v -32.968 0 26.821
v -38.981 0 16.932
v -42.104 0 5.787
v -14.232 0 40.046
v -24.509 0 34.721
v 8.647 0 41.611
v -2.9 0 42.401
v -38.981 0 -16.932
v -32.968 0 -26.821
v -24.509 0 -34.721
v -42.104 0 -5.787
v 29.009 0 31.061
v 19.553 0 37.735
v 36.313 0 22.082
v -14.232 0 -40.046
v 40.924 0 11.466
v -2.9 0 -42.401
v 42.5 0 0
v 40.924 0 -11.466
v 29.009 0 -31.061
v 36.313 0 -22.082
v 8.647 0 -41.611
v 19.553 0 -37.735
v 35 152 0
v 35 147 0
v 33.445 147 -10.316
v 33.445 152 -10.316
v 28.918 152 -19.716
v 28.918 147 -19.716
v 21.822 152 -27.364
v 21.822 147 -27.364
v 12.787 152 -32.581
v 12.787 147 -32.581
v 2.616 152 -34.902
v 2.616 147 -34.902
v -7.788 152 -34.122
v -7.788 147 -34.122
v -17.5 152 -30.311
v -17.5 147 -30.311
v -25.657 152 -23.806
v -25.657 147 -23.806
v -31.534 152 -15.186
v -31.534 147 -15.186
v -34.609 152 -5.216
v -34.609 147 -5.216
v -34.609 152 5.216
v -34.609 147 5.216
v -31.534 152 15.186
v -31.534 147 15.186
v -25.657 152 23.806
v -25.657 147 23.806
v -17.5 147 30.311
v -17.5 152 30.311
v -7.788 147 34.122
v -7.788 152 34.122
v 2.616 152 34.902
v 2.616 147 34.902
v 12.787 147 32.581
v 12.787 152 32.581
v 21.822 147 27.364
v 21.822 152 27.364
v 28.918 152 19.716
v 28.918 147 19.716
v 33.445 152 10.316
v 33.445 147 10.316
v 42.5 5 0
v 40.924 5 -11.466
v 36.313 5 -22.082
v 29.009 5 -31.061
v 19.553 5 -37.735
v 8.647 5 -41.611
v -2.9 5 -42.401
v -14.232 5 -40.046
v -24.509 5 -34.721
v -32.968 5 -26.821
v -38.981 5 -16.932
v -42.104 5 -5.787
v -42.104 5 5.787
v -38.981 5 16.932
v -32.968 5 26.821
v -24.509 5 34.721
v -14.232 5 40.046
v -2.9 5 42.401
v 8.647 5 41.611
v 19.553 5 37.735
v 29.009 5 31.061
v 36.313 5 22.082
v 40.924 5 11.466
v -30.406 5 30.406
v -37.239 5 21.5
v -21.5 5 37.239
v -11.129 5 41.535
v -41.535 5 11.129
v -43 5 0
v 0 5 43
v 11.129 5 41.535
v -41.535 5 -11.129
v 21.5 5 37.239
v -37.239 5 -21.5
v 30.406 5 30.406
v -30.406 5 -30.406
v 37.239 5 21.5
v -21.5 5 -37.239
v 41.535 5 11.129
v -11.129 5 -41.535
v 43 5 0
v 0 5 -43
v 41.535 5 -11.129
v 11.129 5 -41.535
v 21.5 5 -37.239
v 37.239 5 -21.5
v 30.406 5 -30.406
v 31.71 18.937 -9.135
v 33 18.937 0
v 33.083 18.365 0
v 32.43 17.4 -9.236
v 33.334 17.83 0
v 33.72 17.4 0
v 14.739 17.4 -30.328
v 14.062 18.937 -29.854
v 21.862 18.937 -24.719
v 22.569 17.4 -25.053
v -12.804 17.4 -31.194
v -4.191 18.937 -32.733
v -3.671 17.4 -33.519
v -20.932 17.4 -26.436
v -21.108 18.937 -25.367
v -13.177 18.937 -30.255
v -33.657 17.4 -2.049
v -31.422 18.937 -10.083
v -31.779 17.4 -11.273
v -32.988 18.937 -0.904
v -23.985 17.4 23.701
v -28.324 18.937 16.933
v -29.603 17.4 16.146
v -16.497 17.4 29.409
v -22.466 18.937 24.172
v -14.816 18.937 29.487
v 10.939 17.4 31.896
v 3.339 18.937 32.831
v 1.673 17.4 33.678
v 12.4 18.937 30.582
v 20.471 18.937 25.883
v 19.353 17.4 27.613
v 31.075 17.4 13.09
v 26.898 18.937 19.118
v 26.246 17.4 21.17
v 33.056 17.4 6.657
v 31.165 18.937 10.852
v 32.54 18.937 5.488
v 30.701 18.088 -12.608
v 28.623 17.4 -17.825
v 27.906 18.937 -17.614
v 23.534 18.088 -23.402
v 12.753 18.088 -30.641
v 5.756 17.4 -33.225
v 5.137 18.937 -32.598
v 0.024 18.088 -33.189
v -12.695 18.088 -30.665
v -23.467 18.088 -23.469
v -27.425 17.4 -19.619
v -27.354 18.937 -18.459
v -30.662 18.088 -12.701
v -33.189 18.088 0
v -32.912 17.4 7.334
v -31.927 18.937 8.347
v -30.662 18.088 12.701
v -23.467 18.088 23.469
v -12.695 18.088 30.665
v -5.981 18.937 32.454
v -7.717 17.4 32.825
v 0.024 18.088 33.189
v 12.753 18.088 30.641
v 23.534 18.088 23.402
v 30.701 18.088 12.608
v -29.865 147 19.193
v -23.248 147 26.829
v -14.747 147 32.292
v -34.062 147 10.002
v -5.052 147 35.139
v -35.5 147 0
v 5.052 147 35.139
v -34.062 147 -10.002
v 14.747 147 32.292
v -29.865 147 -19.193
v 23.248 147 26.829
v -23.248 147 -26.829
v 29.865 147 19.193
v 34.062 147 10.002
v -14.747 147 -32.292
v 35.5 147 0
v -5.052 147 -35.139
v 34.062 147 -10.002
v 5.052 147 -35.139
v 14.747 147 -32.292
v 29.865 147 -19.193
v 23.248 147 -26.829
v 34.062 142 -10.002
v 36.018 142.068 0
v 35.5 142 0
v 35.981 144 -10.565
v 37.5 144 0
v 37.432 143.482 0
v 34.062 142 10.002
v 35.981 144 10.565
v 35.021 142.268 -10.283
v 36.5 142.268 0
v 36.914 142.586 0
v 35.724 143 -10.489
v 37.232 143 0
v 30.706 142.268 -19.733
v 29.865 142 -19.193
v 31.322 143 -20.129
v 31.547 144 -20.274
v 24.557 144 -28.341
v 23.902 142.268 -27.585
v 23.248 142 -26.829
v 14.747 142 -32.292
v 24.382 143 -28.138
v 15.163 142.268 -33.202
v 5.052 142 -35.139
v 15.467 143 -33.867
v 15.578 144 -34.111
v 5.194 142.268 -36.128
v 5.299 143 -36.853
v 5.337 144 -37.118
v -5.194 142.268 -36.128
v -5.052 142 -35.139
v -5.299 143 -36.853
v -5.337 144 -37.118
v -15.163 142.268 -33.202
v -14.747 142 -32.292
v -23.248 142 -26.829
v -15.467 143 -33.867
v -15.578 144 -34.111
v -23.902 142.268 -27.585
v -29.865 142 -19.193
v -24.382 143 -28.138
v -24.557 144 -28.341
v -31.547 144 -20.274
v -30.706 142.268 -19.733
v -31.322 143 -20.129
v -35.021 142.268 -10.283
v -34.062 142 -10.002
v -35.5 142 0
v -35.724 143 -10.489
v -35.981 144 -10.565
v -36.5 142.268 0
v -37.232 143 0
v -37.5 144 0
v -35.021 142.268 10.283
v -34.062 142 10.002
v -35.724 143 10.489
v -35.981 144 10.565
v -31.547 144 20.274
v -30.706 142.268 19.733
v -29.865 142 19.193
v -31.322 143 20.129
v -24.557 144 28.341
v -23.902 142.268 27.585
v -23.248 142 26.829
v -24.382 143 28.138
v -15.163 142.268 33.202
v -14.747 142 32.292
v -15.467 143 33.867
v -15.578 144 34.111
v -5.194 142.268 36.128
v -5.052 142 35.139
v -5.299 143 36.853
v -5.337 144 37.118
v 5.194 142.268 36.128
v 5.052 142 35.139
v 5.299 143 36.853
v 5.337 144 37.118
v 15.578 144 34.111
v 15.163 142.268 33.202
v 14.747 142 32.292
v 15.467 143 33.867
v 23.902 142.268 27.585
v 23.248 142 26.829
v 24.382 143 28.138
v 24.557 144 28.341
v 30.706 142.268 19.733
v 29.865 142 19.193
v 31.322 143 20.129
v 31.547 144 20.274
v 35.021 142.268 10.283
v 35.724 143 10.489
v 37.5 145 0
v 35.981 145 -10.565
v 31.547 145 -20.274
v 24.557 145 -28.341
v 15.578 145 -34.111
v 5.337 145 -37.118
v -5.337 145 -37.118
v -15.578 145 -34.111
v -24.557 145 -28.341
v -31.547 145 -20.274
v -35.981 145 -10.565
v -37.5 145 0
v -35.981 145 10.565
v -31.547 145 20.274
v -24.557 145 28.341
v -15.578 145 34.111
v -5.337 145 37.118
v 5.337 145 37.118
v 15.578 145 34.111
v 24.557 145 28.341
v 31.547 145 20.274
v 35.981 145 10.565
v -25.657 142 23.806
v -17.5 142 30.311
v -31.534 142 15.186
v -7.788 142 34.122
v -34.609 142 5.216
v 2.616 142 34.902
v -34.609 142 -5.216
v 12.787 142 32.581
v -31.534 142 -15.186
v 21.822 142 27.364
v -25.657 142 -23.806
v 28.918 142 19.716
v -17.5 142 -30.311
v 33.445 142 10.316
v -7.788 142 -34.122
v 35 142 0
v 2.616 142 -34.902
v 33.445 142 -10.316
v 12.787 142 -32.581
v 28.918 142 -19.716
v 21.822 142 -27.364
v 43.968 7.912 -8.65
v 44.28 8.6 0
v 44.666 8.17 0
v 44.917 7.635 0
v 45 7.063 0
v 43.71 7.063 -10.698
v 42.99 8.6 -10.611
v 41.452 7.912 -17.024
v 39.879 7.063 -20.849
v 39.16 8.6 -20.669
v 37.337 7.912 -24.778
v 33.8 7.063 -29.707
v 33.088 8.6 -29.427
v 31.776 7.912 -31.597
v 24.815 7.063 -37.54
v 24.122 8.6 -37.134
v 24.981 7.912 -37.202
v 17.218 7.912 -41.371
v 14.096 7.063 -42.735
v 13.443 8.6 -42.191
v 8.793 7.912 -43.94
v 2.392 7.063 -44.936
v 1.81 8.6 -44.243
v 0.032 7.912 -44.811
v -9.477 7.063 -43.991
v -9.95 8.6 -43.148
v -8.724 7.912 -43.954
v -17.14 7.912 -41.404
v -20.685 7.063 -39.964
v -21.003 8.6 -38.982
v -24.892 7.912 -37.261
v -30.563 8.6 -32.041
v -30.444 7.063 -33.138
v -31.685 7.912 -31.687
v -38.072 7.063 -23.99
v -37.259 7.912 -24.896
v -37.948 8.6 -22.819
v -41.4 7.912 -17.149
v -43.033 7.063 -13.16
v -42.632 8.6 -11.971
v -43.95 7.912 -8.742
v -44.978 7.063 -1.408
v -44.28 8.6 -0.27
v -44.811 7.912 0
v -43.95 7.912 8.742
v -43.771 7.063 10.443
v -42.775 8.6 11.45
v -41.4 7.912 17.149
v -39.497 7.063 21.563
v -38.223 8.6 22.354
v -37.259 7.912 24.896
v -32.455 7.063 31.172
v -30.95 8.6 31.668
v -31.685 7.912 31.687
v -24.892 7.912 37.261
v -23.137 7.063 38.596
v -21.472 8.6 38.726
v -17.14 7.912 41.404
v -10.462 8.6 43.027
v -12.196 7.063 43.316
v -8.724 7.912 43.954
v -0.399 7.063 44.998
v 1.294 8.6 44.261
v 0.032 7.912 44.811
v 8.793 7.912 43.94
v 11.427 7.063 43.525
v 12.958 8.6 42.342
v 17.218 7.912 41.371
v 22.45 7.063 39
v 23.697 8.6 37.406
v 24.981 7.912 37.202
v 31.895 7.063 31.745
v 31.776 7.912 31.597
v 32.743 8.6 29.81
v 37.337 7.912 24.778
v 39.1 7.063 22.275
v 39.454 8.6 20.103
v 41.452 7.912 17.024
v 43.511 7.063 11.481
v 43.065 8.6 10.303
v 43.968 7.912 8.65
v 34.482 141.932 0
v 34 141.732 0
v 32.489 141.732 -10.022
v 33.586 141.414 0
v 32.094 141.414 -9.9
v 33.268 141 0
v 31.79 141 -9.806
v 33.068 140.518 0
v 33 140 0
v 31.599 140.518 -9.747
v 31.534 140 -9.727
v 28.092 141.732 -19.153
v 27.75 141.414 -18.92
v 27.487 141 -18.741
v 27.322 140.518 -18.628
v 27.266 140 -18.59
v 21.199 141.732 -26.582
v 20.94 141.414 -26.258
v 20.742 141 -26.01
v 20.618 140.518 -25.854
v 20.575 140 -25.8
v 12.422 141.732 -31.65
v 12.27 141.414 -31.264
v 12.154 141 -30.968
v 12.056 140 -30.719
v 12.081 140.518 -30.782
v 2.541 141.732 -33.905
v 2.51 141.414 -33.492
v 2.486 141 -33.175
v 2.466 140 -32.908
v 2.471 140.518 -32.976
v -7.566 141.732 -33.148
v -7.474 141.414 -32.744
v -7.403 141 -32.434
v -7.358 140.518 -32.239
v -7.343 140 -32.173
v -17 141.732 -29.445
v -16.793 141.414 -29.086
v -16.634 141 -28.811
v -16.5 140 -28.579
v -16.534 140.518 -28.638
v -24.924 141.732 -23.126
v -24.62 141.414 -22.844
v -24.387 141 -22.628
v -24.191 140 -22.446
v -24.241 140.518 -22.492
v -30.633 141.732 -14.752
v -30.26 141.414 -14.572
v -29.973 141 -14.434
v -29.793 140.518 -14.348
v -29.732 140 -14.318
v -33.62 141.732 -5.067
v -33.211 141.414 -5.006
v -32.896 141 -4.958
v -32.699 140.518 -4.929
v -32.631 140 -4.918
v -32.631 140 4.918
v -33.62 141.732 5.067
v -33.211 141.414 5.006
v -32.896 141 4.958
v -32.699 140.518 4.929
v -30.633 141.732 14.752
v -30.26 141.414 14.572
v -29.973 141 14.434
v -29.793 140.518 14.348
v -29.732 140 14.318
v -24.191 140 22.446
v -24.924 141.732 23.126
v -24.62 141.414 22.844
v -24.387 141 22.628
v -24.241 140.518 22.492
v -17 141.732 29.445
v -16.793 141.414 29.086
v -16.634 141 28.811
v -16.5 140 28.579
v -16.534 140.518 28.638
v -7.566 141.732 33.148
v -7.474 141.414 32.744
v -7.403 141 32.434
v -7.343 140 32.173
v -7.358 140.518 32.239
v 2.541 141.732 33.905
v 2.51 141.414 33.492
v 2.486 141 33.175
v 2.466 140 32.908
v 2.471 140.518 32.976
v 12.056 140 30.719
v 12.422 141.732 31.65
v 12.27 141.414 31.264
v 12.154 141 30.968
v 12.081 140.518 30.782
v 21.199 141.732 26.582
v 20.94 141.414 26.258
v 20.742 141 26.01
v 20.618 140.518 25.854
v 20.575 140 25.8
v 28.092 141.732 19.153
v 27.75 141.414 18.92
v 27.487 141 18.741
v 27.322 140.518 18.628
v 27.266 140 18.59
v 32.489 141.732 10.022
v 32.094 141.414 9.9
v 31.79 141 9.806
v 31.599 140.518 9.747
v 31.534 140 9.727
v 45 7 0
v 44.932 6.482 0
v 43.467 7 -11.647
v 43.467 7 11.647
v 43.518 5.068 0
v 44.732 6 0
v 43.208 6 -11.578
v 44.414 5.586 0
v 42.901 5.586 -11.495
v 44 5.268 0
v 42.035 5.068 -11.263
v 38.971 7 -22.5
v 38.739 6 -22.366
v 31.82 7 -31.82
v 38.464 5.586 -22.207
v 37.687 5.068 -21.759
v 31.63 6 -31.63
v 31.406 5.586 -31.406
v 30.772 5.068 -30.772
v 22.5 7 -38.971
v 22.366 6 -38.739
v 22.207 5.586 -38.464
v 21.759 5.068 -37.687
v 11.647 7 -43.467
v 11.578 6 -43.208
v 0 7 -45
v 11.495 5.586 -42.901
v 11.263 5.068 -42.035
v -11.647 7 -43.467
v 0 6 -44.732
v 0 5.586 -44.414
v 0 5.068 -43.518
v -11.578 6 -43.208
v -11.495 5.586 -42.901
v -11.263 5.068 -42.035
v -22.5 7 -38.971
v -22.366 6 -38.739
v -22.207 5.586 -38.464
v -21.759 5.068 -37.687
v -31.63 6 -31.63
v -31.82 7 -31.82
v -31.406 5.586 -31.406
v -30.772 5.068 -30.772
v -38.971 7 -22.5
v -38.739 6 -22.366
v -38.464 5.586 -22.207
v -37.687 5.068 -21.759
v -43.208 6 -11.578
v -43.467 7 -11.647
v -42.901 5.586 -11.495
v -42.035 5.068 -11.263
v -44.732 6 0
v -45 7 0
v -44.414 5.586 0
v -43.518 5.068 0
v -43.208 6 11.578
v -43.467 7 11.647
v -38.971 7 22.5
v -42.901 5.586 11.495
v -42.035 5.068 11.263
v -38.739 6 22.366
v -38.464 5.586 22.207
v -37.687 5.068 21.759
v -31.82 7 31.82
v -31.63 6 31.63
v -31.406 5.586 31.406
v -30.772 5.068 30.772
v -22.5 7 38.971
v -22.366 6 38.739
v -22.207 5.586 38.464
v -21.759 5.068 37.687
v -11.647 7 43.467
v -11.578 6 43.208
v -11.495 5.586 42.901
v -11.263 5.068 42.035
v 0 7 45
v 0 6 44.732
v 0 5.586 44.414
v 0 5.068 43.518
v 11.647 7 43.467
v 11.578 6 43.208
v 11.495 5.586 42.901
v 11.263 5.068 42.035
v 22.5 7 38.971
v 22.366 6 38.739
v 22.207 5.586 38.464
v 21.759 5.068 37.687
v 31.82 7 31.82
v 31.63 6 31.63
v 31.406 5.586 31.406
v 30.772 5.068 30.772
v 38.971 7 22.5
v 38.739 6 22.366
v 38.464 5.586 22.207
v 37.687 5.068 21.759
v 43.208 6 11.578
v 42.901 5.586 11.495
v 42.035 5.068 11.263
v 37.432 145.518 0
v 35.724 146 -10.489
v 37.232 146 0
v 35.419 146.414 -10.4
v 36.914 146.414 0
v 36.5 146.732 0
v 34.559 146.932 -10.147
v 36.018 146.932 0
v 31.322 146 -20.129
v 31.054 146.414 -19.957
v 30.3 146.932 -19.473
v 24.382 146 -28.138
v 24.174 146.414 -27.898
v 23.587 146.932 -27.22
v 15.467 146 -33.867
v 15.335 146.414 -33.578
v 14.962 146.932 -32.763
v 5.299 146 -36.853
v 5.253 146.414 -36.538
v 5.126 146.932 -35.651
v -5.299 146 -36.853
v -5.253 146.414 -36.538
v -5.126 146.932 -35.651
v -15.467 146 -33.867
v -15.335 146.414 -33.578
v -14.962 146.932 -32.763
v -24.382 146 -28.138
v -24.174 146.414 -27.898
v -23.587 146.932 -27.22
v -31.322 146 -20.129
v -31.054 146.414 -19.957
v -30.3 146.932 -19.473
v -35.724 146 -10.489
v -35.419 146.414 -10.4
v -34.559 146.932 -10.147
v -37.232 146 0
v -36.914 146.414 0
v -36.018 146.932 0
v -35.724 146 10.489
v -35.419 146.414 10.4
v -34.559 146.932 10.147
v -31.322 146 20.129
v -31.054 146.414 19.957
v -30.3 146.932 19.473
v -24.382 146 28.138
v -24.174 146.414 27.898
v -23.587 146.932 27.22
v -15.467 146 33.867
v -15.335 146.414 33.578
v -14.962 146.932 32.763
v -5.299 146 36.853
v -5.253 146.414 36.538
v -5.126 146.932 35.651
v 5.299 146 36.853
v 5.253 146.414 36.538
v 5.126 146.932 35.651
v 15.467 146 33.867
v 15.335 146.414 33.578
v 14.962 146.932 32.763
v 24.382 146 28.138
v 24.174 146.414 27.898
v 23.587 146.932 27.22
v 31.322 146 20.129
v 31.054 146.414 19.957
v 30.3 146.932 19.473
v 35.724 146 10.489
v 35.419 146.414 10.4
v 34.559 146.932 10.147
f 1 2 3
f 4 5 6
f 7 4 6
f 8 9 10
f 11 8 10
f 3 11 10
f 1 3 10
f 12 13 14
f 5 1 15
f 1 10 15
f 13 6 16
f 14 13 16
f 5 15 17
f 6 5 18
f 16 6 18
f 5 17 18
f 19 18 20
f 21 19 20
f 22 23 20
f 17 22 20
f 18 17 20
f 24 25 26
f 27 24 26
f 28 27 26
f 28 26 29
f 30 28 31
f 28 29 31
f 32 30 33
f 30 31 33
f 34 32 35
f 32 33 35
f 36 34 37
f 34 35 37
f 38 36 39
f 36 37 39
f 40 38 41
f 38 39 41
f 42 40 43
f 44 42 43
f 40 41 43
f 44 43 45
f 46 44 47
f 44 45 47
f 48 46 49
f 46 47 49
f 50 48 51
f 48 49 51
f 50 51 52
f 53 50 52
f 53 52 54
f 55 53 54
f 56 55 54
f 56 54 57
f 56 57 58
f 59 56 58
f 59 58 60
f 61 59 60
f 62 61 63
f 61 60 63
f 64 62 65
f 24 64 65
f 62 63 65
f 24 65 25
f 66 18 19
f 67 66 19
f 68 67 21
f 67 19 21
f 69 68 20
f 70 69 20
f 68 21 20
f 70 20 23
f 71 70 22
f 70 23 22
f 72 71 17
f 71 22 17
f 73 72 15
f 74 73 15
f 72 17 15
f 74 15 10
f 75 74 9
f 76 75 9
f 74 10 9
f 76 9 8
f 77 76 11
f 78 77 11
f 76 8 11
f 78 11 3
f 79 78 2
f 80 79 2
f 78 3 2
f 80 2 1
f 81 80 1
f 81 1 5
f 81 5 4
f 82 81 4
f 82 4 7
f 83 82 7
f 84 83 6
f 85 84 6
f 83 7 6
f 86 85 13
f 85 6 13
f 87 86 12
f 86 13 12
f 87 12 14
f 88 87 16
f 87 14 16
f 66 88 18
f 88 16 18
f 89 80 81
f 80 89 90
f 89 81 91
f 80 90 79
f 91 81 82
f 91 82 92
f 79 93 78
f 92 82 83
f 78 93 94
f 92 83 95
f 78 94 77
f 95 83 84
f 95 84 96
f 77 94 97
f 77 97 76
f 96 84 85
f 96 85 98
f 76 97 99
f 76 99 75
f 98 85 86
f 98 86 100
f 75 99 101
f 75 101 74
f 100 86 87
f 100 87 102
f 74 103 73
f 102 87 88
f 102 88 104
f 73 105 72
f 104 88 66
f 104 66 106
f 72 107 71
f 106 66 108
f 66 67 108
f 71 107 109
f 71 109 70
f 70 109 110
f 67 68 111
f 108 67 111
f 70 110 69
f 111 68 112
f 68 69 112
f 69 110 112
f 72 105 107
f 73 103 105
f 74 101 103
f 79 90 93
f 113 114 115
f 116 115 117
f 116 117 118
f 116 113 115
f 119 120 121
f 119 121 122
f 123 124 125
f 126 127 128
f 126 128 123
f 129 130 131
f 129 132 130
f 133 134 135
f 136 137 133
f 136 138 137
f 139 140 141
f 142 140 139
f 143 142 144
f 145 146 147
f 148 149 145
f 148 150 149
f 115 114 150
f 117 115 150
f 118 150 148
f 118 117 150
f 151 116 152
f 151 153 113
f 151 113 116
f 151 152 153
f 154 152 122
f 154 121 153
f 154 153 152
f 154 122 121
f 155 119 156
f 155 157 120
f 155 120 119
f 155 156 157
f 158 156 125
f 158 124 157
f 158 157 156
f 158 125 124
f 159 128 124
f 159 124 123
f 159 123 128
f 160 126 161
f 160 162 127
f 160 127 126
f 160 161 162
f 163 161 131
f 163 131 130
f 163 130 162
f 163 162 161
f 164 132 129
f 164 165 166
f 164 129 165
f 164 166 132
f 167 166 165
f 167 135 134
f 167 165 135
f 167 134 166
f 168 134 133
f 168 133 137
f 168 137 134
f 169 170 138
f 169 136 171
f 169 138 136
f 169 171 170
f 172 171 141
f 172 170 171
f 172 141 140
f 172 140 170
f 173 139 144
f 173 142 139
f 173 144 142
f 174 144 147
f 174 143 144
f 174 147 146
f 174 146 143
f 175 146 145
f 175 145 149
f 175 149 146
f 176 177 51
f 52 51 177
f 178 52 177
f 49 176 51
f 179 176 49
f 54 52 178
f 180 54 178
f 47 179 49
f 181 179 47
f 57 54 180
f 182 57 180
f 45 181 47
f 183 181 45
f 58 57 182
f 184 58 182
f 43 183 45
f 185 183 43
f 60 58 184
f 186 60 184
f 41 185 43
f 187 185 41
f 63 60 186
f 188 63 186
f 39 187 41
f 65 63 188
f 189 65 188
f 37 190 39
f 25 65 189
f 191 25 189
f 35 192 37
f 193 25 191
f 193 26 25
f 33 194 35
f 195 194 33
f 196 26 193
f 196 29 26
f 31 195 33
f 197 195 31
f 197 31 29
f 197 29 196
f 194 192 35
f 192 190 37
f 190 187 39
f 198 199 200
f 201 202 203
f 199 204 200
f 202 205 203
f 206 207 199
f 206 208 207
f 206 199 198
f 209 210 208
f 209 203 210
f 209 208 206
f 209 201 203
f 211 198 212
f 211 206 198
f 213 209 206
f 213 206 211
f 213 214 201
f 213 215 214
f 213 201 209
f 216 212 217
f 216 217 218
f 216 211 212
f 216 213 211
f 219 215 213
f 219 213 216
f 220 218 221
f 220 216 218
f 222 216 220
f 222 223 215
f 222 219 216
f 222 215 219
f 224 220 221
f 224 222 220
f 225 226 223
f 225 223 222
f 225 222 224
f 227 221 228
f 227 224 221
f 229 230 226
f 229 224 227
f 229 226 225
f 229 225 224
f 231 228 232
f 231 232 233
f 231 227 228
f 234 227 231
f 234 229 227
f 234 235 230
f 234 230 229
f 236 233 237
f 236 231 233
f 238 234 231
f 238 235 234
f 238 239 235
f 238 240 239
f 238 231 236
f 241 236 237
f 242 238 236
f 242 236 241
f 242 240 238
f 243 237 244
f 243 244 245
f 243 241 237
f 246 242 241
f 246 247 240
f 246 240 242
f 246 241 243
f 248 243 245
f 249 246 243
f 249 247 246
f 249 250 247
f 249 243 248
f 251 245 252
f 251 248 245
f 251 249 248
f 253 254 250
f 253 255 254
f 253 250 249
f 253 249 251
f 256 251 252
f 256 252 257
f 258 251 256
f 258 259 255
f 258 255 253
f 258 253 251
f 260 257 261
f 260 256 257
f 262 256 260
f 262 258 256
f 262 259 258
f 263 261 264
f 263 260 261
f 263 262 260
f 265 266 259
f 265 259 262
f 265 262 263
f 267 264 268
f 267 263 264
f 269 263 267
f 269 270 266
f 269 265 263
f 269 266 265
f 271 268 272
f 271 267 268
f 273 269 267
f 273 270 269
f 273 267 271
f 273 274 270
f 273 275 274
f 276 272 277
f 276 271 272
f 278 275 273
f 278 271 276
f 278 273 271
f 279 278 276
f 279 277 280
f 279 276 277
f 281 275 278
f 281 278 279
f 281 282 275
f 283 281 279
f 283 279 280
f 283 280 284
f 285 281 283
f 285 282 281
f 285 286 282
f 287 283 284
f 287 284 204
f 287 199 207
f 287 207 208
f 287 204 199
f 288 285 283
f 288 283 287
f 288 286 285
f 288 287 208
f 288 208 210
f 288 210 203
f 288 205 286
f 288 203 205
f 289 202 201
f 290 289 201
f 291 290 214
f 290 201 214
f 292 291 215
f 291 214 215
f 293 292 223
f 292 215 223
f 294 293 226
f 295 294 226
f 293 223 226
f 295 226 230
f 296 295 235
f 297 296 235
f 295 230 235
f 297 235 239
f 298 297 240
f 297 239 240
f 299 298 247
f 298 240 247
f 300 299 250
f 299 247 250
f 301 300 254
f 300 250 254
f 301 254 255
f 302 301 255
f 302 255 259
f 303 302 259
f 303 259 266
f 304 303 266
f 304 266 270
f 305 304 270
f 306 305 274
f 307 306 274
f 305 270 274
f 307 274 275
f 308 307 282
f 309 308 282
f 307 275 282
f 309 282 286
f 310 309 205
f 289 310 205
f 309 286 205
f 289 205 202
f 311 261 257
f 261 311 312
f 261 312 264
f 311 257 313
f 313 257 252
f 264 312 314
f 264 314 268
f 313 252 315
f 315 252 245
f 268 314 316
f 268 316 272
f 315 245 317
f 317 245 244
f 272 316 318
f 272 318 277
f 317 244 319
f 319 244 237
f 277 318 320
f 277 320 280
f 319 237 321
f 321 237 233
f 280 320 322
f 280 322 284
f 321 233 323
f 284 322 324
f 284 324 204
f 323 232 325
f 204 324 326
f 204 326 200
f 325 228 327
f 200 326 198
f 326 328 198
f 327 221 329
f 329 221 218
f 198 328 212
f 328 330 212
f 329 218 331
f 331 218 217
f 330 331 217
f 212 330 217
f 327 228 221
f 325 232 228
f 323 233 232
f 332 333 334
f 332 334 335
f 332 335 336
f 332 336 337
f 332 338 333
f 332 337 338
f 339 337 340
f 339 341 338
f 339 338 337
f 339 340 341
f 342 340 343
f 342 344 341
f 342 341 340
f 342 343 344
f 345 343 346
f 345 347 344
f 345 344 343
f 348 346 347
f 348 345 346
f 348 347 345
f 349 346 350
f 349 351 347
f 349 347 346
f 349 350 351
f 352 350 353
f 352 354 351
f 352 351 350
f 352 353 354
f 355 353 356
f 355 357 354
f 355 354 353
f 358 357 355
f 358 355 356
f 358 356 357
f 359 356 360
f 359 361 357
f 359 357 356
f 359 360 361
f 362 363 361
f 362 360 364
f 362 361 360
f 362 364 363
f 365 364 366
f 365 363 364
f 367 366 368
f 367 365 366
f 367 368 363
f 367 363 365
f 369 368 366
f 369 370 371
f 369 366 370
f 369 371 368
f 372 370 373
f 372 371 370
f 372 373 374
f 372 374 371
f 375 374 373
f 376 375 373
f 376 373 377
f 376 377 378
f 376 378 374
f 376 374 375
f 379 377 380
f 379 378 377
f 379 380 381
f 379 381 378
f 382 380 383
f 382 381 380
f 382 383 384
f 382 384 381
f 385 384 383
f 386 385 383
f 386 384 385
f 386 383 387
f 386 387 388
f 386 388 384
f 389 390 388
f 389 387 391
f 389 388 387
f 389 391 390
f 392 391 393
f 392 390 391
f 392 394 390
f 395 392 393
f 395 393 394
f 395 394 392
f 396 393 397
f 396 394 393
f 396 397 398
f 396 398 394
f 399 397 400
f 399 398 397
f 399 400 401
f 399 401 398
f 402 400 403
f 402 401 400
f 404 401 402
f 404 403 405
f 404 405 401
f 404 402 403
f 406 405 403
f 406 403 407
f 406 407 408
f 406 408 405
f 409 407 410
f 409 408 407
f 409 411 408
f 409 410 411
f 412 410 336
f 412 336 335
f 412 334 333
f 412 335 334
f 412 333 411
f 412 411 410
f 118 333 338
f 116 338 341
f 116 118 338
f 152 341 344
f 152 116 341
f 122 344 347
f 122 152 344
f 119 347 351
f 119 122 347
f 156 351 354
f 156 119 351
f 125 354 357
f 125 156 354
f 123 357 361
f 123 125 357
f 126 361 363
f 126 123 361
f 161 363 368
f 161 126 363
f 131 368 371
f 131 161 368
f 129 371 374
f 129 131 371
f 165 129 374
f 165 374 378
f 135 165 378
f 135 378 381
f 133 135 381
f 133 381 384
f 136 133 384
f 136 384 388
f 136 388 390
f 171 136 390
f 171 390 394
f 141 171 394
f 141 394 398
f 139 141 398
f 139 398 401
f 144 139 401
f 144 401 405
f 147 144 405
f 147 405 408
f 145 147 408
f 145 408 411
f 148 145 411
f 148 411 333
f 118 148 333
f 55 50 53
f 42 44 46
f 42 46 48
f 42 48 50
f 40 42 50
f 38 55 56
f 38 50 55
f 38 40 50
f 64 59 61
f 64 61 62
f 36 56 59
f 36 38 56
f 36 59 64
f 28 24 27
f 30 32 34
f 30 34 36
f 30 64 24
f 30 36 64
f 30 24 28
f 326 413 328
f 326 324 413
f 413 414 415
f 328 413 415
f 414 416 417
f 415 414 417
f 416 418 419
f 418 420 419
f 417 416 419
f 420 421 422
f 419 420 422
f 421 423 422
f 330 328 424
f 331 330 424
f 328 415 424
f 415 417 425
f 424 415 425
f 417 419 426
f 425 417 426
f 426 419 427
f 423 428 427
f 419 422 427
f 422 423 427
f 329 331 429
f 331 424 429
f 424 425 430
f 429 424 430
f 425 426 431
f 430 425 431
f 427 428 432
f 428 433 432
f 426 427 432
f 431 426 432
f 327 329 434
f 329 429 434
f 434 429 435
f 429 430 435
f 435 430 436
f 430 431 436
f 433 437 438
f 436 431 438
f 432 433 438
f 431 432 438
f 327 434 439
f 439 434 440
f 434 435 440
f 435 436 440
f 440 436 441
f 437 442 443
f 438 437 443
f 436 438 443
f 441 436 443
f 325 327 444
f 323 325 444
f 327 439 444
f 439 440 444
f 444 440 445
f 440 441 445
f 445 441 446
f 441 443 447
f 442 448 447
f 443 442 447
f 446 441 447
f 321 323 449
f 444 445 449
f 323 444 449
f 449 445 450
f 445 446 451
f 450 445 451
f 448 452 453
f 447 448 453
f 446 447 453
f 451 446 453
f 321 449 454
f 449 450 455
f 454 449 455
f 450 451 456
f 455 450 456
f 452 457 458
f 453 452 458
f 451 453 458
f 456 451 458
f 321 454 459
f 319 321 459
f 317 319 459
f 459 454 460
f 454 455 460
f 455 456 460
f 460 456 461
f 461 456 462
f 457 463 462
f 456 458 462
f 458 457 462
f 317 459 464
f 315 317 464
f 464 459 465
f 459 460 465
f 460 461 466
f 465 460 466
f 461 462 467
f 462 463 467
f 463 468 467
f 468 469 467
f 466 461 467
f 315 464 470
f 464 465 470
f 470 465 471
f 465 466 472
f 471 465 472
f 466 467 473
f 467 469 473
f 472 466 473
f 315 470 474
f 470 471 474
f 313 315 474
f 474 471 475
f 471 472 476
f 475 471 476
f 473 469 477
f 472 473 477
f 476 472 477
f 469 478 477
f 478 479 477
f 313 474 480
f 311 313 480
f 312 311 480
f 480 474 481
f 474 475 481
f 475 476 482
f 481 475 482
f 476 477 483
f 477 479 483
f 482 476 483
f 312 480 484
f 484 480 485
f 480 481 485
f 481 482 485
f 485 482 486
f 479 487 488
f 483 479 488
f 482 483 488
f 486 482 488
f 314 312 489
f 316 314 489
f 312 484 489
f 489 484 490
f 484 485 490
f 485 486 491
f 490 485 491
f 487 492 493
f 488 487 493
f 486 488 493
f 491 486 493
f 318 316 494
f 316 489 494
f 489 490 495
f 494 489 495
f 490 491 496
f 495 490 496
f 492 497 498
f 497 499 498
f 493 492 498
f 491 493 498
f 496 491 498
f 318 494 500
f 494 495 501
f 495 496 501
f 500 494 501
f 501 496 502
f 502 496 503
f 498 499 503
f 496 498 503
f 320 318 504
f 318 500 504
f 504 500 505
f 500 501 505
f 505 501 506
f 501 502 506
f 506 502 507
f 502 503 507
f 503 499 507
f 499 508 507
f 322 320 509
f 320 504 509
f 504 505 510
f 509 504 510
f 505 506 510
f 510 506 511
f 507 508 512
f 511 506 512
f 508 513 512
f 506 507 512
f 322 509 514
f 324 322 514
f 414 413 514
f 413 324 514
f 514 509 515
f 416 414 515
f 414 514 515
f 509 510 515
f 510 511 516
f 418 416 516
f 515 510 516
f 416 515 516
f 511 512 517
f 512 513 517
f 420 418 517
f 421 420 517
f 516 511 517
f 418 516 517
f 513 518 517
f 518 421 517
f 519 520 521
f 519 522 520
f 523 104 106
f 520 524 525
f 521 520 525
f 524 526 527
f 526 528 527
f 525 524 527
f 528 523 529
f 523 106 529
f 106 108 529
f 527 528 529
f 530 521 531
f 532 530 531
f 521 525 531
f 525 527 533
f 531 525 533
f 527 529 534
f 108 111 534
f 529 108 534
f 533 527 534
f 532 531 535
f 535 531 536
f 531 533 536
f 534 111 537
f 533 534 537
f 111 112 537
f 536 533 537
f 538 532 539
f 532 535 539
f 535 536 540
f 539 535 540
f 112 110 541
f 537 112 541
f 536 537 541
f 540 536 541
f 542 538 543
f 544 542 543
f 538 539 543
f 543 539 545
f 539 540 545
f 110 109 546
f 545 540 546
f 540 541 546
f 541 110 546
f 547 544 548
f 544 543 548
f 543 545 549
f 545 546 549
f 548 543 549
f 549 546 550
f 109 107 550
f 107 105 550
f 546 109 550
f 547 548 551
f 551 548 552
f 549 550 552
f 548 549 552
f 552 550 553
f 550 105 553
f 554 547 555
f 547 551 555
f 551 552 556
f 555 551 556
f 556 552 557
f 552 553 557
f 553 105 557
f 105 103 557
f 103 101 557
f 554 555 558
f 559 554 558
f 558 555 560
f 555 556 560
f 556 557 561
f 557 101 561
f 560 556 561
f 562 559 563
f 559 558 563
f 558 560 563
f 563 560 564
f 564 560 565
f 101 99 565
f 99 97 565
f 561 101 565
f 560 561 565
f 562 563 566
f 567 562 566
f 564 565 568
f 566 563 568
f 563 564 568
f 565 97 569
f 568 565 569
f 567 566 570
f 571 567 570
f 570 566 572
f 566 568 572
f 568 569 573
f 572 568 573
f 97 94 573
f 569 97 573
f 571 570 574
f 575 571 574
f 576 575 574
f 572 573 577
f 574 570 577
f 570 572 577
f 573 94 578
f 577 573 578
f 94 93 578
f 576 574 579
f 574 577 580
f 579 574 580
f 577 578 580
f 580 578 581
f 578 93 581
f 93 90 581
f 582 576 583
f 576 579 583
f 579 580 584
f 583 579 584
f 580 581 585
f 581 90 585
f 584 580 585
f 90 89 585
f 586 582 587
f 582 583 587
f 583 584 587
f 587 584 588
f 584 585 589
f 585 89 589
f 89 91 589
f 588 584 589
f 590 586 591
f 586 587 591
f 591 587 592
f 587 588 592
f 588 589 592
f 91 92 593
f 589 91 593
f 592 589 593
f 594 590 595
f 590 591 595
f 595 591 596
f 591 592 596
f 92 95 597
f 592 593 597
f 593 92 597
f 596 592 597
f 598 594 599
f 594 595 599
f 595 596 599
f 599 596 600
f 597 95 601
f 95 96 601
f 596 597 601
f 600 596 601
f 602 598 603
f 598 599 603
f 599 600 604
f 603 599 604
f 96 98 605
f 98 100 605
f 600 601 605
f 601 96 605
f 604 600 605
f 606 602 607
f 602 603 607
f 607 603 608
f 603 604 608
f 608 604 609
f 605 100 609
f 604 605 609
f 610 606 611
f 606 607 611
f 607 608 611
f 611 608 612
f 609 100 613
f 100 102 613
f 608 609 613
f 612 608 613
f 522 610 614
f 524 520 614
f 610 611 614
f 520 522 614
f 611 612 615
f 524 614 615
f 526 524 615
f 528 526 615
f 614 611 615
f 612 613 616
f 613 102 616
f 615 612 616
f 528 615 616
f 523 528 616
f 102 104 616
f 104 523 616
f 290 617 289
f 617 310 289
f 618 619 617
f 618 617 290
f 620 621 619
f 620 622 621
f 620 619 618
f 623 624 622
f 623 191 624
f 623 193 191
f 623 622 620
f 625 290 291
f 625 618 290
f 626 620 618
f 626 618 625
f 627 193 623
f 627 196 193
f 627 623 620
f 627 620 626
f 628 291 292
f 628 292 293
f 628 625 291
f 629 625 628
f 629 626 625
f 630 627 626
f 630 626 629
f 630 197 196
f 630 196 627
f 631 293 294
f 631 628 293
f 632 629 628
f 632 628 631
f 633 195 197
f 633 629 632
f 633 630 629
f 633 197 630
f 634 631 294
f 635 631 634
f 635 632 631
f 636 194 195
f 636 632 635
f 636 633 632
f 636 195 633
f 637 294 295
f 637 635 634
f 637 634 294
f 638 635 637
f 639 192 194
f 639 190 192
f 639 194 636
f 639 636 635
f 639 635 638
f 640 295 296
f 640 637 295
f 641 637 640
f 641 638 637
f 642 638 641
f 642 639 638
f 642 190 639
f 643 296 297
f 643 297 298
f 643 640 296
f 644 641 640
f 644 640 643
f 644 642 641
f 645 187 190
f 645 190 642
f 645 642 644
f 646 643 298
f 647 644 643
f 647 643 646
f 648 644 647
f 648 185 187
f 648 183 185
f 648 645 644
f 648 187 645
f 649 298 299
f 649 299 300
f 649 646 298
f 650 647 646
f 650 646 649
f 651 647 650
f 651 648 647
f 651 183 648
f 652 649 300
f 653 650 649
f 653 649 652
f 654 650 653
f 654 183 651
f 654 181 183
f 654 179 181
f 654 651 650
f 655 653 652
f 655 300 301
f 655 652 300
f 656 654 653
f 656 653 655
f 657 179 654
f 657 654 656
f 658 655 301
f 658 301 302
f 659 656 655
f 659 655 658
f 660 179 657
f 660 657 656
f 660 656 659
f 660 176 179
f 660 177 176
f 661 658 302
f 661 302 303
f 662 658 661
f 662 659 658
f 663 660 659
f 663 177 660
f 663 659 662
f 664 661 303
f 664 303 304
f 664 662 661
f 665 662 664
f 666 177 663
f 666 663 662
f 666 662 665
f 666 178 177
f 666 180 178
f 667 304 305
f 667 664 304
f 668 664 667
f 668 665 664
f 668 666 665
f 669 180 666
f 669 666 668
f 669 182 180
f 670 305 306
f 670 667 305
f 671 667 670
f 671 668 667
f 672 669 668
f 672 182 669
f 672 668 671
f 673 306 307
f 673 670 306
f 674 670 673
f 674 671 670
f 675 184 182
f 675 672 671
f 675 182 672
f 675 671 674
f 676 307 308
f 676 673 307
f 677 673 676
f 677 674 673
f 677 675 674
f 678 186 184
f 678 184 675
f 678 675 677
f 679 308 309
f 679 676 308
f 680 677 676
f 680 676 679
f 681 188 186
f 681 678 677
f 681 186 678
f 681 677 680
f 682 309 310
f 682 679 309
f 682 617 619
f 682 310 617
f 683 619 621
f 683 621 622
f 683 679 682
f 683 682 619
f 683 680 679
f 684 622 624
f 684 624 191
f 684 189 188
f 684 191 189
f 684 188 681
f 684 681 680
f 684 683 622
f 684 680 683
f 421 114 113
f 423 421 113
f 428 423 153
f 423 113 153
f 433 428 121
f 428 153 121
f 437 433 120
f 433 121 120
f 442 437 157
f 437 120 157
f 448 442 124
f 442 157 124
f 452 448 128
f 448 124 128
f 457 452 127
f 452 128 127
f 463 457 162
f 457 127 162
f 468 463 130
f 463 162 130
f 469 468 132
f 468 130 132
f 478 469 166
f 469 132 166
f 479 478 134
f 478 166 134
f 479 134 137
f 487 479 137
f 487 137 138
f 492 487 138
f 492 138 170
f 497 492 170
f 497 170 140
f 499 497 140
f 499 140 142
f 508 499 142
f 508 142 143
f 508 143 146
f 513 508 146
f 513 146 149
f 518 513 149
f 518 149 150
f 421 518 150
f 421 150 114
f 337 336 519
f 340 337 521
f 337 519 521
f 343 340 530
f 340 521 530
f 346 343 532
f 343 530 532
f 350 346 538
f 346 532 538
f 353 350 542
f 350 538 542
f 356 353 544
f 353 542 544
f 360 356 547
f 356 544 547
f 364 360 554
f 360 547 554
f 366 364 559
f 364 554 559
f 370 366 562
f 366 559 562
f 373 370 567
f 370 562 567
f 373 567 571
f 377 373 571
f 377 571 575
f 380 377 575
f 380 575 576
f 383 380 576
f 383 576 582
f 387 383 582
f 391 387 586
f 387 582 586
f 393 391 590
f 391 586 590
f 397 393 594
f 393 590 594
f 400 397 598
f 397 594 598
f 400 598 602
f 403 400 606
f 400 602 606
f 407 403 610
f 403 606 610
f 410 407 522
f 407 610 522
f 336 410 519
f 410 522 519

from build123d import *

# Parameters (mm, degrees)
SKETCH1_R           = 42.5
BOSS_EXTRUDE1_DEPTH = 5
SKETCH2_R           = 45
BOSS_EXTRUDE2_DEPTH = 3
SKETCH3_R           = 33
BOSS_EXTRUDE3_START = -18
SKETCH4_R           = 33
BOSS_EXTRUDE3_DEPTH = 142
SKETCH5_R           = 37.5
BOSS_EXTRUDE4_DEPTH = 5
FILLET1_R           = 2
FILLET2_R           = 2
SKETCH7_R           = 35
BOSS_EXTRUDE5_DEPTH = 5


with BuildPart() as part:
    # Sketch1 → Boss-Extrude1 (new body)
    with BuildSketch(Plane(origin=(0, 0, 0), x_dir=(1, 0, 0), z_dir=(0, 1, 0))):
        Circle(SKETCH1_R)
    extrude(amount=BOSS_EXTRUDE1_DEPTH)

    # Sketch2 → Boss-Extrude2 (add)
    with BuildSketch(Plane(origin=(0, 5, 0), x_dir=(1, 0, 0), z_dir=(0, 1, 0))):
        Circle(SKETCH2_R)
    extrude(amount=BOSS_EXTRUDE2_DEPTH)

    # Sketch3 → section 1 of loft1
    with BuildSketch(Plane(origin=(0, 18, 0), x_dir=(1, 0, 0), z_dir=(0, 1, 0)), mode=Mode.PRIVATE) as loft1_s1:
        Circle(SKETCH3_R)
    # loft from a face of the part (loft1)
    loft([part.faces().sort_by_distance((0, 8, 0))[0], loft1_s1.sketch])

    # Sketch4 → Boss-Extrude3 (add)
    with BuildSketch(Plane(origin=(0, 18, 0), x_dir=(1, 0, 0), z_dir=(0, 1, 0)).offset(BOSS_EXTRUDE3_START)):
        Circle(SKETCH4_R)
    extrude(amount=BOSS_EXTRUDE3_DEPTH)

    # Sketch5 → Boss-Extrude4 (add)
    with BuildSketch(Plane(origin=(0, 142, 0), x_dir=(1, 0, 0), z_dir=(0, 1, 0))):
        Circle(SKETCH5_R)
    extrude(amount=BOSS_EXTRUDE4_DEPTH)

    # Fillet1
    fillet1_edges = [part.edges().sort_by_distance(p)[0] for p in [
        (-33, 142, 0),
        (-33, 18, 0),
        (-45, 8, 0),
        (-45, 5, 0),
    ]]
    fillet(fillet1_edges, radius=FILLET1_R)

    # Fillet2
    fillet2_edges = [part.edges().sort_by_distance(p)[0] for p in [
        (-37.5, 142, 0),
        (-37.5, 147, 0),
    ]]
    fillet(fillet2_edges, radius=FILLET2_R)

    # Sketch7 → Boss-Extrude5 (add)
    with BuildSketch(Plane(origin=(0, 147, 0), x_dir=(1, 0, 0), z_dir=(0, 1, 0))):
        Circle(SKETCH7_R)
    extrude(amount=BOSS_EXTRUDE5_DEPTH)


solid = part.part
